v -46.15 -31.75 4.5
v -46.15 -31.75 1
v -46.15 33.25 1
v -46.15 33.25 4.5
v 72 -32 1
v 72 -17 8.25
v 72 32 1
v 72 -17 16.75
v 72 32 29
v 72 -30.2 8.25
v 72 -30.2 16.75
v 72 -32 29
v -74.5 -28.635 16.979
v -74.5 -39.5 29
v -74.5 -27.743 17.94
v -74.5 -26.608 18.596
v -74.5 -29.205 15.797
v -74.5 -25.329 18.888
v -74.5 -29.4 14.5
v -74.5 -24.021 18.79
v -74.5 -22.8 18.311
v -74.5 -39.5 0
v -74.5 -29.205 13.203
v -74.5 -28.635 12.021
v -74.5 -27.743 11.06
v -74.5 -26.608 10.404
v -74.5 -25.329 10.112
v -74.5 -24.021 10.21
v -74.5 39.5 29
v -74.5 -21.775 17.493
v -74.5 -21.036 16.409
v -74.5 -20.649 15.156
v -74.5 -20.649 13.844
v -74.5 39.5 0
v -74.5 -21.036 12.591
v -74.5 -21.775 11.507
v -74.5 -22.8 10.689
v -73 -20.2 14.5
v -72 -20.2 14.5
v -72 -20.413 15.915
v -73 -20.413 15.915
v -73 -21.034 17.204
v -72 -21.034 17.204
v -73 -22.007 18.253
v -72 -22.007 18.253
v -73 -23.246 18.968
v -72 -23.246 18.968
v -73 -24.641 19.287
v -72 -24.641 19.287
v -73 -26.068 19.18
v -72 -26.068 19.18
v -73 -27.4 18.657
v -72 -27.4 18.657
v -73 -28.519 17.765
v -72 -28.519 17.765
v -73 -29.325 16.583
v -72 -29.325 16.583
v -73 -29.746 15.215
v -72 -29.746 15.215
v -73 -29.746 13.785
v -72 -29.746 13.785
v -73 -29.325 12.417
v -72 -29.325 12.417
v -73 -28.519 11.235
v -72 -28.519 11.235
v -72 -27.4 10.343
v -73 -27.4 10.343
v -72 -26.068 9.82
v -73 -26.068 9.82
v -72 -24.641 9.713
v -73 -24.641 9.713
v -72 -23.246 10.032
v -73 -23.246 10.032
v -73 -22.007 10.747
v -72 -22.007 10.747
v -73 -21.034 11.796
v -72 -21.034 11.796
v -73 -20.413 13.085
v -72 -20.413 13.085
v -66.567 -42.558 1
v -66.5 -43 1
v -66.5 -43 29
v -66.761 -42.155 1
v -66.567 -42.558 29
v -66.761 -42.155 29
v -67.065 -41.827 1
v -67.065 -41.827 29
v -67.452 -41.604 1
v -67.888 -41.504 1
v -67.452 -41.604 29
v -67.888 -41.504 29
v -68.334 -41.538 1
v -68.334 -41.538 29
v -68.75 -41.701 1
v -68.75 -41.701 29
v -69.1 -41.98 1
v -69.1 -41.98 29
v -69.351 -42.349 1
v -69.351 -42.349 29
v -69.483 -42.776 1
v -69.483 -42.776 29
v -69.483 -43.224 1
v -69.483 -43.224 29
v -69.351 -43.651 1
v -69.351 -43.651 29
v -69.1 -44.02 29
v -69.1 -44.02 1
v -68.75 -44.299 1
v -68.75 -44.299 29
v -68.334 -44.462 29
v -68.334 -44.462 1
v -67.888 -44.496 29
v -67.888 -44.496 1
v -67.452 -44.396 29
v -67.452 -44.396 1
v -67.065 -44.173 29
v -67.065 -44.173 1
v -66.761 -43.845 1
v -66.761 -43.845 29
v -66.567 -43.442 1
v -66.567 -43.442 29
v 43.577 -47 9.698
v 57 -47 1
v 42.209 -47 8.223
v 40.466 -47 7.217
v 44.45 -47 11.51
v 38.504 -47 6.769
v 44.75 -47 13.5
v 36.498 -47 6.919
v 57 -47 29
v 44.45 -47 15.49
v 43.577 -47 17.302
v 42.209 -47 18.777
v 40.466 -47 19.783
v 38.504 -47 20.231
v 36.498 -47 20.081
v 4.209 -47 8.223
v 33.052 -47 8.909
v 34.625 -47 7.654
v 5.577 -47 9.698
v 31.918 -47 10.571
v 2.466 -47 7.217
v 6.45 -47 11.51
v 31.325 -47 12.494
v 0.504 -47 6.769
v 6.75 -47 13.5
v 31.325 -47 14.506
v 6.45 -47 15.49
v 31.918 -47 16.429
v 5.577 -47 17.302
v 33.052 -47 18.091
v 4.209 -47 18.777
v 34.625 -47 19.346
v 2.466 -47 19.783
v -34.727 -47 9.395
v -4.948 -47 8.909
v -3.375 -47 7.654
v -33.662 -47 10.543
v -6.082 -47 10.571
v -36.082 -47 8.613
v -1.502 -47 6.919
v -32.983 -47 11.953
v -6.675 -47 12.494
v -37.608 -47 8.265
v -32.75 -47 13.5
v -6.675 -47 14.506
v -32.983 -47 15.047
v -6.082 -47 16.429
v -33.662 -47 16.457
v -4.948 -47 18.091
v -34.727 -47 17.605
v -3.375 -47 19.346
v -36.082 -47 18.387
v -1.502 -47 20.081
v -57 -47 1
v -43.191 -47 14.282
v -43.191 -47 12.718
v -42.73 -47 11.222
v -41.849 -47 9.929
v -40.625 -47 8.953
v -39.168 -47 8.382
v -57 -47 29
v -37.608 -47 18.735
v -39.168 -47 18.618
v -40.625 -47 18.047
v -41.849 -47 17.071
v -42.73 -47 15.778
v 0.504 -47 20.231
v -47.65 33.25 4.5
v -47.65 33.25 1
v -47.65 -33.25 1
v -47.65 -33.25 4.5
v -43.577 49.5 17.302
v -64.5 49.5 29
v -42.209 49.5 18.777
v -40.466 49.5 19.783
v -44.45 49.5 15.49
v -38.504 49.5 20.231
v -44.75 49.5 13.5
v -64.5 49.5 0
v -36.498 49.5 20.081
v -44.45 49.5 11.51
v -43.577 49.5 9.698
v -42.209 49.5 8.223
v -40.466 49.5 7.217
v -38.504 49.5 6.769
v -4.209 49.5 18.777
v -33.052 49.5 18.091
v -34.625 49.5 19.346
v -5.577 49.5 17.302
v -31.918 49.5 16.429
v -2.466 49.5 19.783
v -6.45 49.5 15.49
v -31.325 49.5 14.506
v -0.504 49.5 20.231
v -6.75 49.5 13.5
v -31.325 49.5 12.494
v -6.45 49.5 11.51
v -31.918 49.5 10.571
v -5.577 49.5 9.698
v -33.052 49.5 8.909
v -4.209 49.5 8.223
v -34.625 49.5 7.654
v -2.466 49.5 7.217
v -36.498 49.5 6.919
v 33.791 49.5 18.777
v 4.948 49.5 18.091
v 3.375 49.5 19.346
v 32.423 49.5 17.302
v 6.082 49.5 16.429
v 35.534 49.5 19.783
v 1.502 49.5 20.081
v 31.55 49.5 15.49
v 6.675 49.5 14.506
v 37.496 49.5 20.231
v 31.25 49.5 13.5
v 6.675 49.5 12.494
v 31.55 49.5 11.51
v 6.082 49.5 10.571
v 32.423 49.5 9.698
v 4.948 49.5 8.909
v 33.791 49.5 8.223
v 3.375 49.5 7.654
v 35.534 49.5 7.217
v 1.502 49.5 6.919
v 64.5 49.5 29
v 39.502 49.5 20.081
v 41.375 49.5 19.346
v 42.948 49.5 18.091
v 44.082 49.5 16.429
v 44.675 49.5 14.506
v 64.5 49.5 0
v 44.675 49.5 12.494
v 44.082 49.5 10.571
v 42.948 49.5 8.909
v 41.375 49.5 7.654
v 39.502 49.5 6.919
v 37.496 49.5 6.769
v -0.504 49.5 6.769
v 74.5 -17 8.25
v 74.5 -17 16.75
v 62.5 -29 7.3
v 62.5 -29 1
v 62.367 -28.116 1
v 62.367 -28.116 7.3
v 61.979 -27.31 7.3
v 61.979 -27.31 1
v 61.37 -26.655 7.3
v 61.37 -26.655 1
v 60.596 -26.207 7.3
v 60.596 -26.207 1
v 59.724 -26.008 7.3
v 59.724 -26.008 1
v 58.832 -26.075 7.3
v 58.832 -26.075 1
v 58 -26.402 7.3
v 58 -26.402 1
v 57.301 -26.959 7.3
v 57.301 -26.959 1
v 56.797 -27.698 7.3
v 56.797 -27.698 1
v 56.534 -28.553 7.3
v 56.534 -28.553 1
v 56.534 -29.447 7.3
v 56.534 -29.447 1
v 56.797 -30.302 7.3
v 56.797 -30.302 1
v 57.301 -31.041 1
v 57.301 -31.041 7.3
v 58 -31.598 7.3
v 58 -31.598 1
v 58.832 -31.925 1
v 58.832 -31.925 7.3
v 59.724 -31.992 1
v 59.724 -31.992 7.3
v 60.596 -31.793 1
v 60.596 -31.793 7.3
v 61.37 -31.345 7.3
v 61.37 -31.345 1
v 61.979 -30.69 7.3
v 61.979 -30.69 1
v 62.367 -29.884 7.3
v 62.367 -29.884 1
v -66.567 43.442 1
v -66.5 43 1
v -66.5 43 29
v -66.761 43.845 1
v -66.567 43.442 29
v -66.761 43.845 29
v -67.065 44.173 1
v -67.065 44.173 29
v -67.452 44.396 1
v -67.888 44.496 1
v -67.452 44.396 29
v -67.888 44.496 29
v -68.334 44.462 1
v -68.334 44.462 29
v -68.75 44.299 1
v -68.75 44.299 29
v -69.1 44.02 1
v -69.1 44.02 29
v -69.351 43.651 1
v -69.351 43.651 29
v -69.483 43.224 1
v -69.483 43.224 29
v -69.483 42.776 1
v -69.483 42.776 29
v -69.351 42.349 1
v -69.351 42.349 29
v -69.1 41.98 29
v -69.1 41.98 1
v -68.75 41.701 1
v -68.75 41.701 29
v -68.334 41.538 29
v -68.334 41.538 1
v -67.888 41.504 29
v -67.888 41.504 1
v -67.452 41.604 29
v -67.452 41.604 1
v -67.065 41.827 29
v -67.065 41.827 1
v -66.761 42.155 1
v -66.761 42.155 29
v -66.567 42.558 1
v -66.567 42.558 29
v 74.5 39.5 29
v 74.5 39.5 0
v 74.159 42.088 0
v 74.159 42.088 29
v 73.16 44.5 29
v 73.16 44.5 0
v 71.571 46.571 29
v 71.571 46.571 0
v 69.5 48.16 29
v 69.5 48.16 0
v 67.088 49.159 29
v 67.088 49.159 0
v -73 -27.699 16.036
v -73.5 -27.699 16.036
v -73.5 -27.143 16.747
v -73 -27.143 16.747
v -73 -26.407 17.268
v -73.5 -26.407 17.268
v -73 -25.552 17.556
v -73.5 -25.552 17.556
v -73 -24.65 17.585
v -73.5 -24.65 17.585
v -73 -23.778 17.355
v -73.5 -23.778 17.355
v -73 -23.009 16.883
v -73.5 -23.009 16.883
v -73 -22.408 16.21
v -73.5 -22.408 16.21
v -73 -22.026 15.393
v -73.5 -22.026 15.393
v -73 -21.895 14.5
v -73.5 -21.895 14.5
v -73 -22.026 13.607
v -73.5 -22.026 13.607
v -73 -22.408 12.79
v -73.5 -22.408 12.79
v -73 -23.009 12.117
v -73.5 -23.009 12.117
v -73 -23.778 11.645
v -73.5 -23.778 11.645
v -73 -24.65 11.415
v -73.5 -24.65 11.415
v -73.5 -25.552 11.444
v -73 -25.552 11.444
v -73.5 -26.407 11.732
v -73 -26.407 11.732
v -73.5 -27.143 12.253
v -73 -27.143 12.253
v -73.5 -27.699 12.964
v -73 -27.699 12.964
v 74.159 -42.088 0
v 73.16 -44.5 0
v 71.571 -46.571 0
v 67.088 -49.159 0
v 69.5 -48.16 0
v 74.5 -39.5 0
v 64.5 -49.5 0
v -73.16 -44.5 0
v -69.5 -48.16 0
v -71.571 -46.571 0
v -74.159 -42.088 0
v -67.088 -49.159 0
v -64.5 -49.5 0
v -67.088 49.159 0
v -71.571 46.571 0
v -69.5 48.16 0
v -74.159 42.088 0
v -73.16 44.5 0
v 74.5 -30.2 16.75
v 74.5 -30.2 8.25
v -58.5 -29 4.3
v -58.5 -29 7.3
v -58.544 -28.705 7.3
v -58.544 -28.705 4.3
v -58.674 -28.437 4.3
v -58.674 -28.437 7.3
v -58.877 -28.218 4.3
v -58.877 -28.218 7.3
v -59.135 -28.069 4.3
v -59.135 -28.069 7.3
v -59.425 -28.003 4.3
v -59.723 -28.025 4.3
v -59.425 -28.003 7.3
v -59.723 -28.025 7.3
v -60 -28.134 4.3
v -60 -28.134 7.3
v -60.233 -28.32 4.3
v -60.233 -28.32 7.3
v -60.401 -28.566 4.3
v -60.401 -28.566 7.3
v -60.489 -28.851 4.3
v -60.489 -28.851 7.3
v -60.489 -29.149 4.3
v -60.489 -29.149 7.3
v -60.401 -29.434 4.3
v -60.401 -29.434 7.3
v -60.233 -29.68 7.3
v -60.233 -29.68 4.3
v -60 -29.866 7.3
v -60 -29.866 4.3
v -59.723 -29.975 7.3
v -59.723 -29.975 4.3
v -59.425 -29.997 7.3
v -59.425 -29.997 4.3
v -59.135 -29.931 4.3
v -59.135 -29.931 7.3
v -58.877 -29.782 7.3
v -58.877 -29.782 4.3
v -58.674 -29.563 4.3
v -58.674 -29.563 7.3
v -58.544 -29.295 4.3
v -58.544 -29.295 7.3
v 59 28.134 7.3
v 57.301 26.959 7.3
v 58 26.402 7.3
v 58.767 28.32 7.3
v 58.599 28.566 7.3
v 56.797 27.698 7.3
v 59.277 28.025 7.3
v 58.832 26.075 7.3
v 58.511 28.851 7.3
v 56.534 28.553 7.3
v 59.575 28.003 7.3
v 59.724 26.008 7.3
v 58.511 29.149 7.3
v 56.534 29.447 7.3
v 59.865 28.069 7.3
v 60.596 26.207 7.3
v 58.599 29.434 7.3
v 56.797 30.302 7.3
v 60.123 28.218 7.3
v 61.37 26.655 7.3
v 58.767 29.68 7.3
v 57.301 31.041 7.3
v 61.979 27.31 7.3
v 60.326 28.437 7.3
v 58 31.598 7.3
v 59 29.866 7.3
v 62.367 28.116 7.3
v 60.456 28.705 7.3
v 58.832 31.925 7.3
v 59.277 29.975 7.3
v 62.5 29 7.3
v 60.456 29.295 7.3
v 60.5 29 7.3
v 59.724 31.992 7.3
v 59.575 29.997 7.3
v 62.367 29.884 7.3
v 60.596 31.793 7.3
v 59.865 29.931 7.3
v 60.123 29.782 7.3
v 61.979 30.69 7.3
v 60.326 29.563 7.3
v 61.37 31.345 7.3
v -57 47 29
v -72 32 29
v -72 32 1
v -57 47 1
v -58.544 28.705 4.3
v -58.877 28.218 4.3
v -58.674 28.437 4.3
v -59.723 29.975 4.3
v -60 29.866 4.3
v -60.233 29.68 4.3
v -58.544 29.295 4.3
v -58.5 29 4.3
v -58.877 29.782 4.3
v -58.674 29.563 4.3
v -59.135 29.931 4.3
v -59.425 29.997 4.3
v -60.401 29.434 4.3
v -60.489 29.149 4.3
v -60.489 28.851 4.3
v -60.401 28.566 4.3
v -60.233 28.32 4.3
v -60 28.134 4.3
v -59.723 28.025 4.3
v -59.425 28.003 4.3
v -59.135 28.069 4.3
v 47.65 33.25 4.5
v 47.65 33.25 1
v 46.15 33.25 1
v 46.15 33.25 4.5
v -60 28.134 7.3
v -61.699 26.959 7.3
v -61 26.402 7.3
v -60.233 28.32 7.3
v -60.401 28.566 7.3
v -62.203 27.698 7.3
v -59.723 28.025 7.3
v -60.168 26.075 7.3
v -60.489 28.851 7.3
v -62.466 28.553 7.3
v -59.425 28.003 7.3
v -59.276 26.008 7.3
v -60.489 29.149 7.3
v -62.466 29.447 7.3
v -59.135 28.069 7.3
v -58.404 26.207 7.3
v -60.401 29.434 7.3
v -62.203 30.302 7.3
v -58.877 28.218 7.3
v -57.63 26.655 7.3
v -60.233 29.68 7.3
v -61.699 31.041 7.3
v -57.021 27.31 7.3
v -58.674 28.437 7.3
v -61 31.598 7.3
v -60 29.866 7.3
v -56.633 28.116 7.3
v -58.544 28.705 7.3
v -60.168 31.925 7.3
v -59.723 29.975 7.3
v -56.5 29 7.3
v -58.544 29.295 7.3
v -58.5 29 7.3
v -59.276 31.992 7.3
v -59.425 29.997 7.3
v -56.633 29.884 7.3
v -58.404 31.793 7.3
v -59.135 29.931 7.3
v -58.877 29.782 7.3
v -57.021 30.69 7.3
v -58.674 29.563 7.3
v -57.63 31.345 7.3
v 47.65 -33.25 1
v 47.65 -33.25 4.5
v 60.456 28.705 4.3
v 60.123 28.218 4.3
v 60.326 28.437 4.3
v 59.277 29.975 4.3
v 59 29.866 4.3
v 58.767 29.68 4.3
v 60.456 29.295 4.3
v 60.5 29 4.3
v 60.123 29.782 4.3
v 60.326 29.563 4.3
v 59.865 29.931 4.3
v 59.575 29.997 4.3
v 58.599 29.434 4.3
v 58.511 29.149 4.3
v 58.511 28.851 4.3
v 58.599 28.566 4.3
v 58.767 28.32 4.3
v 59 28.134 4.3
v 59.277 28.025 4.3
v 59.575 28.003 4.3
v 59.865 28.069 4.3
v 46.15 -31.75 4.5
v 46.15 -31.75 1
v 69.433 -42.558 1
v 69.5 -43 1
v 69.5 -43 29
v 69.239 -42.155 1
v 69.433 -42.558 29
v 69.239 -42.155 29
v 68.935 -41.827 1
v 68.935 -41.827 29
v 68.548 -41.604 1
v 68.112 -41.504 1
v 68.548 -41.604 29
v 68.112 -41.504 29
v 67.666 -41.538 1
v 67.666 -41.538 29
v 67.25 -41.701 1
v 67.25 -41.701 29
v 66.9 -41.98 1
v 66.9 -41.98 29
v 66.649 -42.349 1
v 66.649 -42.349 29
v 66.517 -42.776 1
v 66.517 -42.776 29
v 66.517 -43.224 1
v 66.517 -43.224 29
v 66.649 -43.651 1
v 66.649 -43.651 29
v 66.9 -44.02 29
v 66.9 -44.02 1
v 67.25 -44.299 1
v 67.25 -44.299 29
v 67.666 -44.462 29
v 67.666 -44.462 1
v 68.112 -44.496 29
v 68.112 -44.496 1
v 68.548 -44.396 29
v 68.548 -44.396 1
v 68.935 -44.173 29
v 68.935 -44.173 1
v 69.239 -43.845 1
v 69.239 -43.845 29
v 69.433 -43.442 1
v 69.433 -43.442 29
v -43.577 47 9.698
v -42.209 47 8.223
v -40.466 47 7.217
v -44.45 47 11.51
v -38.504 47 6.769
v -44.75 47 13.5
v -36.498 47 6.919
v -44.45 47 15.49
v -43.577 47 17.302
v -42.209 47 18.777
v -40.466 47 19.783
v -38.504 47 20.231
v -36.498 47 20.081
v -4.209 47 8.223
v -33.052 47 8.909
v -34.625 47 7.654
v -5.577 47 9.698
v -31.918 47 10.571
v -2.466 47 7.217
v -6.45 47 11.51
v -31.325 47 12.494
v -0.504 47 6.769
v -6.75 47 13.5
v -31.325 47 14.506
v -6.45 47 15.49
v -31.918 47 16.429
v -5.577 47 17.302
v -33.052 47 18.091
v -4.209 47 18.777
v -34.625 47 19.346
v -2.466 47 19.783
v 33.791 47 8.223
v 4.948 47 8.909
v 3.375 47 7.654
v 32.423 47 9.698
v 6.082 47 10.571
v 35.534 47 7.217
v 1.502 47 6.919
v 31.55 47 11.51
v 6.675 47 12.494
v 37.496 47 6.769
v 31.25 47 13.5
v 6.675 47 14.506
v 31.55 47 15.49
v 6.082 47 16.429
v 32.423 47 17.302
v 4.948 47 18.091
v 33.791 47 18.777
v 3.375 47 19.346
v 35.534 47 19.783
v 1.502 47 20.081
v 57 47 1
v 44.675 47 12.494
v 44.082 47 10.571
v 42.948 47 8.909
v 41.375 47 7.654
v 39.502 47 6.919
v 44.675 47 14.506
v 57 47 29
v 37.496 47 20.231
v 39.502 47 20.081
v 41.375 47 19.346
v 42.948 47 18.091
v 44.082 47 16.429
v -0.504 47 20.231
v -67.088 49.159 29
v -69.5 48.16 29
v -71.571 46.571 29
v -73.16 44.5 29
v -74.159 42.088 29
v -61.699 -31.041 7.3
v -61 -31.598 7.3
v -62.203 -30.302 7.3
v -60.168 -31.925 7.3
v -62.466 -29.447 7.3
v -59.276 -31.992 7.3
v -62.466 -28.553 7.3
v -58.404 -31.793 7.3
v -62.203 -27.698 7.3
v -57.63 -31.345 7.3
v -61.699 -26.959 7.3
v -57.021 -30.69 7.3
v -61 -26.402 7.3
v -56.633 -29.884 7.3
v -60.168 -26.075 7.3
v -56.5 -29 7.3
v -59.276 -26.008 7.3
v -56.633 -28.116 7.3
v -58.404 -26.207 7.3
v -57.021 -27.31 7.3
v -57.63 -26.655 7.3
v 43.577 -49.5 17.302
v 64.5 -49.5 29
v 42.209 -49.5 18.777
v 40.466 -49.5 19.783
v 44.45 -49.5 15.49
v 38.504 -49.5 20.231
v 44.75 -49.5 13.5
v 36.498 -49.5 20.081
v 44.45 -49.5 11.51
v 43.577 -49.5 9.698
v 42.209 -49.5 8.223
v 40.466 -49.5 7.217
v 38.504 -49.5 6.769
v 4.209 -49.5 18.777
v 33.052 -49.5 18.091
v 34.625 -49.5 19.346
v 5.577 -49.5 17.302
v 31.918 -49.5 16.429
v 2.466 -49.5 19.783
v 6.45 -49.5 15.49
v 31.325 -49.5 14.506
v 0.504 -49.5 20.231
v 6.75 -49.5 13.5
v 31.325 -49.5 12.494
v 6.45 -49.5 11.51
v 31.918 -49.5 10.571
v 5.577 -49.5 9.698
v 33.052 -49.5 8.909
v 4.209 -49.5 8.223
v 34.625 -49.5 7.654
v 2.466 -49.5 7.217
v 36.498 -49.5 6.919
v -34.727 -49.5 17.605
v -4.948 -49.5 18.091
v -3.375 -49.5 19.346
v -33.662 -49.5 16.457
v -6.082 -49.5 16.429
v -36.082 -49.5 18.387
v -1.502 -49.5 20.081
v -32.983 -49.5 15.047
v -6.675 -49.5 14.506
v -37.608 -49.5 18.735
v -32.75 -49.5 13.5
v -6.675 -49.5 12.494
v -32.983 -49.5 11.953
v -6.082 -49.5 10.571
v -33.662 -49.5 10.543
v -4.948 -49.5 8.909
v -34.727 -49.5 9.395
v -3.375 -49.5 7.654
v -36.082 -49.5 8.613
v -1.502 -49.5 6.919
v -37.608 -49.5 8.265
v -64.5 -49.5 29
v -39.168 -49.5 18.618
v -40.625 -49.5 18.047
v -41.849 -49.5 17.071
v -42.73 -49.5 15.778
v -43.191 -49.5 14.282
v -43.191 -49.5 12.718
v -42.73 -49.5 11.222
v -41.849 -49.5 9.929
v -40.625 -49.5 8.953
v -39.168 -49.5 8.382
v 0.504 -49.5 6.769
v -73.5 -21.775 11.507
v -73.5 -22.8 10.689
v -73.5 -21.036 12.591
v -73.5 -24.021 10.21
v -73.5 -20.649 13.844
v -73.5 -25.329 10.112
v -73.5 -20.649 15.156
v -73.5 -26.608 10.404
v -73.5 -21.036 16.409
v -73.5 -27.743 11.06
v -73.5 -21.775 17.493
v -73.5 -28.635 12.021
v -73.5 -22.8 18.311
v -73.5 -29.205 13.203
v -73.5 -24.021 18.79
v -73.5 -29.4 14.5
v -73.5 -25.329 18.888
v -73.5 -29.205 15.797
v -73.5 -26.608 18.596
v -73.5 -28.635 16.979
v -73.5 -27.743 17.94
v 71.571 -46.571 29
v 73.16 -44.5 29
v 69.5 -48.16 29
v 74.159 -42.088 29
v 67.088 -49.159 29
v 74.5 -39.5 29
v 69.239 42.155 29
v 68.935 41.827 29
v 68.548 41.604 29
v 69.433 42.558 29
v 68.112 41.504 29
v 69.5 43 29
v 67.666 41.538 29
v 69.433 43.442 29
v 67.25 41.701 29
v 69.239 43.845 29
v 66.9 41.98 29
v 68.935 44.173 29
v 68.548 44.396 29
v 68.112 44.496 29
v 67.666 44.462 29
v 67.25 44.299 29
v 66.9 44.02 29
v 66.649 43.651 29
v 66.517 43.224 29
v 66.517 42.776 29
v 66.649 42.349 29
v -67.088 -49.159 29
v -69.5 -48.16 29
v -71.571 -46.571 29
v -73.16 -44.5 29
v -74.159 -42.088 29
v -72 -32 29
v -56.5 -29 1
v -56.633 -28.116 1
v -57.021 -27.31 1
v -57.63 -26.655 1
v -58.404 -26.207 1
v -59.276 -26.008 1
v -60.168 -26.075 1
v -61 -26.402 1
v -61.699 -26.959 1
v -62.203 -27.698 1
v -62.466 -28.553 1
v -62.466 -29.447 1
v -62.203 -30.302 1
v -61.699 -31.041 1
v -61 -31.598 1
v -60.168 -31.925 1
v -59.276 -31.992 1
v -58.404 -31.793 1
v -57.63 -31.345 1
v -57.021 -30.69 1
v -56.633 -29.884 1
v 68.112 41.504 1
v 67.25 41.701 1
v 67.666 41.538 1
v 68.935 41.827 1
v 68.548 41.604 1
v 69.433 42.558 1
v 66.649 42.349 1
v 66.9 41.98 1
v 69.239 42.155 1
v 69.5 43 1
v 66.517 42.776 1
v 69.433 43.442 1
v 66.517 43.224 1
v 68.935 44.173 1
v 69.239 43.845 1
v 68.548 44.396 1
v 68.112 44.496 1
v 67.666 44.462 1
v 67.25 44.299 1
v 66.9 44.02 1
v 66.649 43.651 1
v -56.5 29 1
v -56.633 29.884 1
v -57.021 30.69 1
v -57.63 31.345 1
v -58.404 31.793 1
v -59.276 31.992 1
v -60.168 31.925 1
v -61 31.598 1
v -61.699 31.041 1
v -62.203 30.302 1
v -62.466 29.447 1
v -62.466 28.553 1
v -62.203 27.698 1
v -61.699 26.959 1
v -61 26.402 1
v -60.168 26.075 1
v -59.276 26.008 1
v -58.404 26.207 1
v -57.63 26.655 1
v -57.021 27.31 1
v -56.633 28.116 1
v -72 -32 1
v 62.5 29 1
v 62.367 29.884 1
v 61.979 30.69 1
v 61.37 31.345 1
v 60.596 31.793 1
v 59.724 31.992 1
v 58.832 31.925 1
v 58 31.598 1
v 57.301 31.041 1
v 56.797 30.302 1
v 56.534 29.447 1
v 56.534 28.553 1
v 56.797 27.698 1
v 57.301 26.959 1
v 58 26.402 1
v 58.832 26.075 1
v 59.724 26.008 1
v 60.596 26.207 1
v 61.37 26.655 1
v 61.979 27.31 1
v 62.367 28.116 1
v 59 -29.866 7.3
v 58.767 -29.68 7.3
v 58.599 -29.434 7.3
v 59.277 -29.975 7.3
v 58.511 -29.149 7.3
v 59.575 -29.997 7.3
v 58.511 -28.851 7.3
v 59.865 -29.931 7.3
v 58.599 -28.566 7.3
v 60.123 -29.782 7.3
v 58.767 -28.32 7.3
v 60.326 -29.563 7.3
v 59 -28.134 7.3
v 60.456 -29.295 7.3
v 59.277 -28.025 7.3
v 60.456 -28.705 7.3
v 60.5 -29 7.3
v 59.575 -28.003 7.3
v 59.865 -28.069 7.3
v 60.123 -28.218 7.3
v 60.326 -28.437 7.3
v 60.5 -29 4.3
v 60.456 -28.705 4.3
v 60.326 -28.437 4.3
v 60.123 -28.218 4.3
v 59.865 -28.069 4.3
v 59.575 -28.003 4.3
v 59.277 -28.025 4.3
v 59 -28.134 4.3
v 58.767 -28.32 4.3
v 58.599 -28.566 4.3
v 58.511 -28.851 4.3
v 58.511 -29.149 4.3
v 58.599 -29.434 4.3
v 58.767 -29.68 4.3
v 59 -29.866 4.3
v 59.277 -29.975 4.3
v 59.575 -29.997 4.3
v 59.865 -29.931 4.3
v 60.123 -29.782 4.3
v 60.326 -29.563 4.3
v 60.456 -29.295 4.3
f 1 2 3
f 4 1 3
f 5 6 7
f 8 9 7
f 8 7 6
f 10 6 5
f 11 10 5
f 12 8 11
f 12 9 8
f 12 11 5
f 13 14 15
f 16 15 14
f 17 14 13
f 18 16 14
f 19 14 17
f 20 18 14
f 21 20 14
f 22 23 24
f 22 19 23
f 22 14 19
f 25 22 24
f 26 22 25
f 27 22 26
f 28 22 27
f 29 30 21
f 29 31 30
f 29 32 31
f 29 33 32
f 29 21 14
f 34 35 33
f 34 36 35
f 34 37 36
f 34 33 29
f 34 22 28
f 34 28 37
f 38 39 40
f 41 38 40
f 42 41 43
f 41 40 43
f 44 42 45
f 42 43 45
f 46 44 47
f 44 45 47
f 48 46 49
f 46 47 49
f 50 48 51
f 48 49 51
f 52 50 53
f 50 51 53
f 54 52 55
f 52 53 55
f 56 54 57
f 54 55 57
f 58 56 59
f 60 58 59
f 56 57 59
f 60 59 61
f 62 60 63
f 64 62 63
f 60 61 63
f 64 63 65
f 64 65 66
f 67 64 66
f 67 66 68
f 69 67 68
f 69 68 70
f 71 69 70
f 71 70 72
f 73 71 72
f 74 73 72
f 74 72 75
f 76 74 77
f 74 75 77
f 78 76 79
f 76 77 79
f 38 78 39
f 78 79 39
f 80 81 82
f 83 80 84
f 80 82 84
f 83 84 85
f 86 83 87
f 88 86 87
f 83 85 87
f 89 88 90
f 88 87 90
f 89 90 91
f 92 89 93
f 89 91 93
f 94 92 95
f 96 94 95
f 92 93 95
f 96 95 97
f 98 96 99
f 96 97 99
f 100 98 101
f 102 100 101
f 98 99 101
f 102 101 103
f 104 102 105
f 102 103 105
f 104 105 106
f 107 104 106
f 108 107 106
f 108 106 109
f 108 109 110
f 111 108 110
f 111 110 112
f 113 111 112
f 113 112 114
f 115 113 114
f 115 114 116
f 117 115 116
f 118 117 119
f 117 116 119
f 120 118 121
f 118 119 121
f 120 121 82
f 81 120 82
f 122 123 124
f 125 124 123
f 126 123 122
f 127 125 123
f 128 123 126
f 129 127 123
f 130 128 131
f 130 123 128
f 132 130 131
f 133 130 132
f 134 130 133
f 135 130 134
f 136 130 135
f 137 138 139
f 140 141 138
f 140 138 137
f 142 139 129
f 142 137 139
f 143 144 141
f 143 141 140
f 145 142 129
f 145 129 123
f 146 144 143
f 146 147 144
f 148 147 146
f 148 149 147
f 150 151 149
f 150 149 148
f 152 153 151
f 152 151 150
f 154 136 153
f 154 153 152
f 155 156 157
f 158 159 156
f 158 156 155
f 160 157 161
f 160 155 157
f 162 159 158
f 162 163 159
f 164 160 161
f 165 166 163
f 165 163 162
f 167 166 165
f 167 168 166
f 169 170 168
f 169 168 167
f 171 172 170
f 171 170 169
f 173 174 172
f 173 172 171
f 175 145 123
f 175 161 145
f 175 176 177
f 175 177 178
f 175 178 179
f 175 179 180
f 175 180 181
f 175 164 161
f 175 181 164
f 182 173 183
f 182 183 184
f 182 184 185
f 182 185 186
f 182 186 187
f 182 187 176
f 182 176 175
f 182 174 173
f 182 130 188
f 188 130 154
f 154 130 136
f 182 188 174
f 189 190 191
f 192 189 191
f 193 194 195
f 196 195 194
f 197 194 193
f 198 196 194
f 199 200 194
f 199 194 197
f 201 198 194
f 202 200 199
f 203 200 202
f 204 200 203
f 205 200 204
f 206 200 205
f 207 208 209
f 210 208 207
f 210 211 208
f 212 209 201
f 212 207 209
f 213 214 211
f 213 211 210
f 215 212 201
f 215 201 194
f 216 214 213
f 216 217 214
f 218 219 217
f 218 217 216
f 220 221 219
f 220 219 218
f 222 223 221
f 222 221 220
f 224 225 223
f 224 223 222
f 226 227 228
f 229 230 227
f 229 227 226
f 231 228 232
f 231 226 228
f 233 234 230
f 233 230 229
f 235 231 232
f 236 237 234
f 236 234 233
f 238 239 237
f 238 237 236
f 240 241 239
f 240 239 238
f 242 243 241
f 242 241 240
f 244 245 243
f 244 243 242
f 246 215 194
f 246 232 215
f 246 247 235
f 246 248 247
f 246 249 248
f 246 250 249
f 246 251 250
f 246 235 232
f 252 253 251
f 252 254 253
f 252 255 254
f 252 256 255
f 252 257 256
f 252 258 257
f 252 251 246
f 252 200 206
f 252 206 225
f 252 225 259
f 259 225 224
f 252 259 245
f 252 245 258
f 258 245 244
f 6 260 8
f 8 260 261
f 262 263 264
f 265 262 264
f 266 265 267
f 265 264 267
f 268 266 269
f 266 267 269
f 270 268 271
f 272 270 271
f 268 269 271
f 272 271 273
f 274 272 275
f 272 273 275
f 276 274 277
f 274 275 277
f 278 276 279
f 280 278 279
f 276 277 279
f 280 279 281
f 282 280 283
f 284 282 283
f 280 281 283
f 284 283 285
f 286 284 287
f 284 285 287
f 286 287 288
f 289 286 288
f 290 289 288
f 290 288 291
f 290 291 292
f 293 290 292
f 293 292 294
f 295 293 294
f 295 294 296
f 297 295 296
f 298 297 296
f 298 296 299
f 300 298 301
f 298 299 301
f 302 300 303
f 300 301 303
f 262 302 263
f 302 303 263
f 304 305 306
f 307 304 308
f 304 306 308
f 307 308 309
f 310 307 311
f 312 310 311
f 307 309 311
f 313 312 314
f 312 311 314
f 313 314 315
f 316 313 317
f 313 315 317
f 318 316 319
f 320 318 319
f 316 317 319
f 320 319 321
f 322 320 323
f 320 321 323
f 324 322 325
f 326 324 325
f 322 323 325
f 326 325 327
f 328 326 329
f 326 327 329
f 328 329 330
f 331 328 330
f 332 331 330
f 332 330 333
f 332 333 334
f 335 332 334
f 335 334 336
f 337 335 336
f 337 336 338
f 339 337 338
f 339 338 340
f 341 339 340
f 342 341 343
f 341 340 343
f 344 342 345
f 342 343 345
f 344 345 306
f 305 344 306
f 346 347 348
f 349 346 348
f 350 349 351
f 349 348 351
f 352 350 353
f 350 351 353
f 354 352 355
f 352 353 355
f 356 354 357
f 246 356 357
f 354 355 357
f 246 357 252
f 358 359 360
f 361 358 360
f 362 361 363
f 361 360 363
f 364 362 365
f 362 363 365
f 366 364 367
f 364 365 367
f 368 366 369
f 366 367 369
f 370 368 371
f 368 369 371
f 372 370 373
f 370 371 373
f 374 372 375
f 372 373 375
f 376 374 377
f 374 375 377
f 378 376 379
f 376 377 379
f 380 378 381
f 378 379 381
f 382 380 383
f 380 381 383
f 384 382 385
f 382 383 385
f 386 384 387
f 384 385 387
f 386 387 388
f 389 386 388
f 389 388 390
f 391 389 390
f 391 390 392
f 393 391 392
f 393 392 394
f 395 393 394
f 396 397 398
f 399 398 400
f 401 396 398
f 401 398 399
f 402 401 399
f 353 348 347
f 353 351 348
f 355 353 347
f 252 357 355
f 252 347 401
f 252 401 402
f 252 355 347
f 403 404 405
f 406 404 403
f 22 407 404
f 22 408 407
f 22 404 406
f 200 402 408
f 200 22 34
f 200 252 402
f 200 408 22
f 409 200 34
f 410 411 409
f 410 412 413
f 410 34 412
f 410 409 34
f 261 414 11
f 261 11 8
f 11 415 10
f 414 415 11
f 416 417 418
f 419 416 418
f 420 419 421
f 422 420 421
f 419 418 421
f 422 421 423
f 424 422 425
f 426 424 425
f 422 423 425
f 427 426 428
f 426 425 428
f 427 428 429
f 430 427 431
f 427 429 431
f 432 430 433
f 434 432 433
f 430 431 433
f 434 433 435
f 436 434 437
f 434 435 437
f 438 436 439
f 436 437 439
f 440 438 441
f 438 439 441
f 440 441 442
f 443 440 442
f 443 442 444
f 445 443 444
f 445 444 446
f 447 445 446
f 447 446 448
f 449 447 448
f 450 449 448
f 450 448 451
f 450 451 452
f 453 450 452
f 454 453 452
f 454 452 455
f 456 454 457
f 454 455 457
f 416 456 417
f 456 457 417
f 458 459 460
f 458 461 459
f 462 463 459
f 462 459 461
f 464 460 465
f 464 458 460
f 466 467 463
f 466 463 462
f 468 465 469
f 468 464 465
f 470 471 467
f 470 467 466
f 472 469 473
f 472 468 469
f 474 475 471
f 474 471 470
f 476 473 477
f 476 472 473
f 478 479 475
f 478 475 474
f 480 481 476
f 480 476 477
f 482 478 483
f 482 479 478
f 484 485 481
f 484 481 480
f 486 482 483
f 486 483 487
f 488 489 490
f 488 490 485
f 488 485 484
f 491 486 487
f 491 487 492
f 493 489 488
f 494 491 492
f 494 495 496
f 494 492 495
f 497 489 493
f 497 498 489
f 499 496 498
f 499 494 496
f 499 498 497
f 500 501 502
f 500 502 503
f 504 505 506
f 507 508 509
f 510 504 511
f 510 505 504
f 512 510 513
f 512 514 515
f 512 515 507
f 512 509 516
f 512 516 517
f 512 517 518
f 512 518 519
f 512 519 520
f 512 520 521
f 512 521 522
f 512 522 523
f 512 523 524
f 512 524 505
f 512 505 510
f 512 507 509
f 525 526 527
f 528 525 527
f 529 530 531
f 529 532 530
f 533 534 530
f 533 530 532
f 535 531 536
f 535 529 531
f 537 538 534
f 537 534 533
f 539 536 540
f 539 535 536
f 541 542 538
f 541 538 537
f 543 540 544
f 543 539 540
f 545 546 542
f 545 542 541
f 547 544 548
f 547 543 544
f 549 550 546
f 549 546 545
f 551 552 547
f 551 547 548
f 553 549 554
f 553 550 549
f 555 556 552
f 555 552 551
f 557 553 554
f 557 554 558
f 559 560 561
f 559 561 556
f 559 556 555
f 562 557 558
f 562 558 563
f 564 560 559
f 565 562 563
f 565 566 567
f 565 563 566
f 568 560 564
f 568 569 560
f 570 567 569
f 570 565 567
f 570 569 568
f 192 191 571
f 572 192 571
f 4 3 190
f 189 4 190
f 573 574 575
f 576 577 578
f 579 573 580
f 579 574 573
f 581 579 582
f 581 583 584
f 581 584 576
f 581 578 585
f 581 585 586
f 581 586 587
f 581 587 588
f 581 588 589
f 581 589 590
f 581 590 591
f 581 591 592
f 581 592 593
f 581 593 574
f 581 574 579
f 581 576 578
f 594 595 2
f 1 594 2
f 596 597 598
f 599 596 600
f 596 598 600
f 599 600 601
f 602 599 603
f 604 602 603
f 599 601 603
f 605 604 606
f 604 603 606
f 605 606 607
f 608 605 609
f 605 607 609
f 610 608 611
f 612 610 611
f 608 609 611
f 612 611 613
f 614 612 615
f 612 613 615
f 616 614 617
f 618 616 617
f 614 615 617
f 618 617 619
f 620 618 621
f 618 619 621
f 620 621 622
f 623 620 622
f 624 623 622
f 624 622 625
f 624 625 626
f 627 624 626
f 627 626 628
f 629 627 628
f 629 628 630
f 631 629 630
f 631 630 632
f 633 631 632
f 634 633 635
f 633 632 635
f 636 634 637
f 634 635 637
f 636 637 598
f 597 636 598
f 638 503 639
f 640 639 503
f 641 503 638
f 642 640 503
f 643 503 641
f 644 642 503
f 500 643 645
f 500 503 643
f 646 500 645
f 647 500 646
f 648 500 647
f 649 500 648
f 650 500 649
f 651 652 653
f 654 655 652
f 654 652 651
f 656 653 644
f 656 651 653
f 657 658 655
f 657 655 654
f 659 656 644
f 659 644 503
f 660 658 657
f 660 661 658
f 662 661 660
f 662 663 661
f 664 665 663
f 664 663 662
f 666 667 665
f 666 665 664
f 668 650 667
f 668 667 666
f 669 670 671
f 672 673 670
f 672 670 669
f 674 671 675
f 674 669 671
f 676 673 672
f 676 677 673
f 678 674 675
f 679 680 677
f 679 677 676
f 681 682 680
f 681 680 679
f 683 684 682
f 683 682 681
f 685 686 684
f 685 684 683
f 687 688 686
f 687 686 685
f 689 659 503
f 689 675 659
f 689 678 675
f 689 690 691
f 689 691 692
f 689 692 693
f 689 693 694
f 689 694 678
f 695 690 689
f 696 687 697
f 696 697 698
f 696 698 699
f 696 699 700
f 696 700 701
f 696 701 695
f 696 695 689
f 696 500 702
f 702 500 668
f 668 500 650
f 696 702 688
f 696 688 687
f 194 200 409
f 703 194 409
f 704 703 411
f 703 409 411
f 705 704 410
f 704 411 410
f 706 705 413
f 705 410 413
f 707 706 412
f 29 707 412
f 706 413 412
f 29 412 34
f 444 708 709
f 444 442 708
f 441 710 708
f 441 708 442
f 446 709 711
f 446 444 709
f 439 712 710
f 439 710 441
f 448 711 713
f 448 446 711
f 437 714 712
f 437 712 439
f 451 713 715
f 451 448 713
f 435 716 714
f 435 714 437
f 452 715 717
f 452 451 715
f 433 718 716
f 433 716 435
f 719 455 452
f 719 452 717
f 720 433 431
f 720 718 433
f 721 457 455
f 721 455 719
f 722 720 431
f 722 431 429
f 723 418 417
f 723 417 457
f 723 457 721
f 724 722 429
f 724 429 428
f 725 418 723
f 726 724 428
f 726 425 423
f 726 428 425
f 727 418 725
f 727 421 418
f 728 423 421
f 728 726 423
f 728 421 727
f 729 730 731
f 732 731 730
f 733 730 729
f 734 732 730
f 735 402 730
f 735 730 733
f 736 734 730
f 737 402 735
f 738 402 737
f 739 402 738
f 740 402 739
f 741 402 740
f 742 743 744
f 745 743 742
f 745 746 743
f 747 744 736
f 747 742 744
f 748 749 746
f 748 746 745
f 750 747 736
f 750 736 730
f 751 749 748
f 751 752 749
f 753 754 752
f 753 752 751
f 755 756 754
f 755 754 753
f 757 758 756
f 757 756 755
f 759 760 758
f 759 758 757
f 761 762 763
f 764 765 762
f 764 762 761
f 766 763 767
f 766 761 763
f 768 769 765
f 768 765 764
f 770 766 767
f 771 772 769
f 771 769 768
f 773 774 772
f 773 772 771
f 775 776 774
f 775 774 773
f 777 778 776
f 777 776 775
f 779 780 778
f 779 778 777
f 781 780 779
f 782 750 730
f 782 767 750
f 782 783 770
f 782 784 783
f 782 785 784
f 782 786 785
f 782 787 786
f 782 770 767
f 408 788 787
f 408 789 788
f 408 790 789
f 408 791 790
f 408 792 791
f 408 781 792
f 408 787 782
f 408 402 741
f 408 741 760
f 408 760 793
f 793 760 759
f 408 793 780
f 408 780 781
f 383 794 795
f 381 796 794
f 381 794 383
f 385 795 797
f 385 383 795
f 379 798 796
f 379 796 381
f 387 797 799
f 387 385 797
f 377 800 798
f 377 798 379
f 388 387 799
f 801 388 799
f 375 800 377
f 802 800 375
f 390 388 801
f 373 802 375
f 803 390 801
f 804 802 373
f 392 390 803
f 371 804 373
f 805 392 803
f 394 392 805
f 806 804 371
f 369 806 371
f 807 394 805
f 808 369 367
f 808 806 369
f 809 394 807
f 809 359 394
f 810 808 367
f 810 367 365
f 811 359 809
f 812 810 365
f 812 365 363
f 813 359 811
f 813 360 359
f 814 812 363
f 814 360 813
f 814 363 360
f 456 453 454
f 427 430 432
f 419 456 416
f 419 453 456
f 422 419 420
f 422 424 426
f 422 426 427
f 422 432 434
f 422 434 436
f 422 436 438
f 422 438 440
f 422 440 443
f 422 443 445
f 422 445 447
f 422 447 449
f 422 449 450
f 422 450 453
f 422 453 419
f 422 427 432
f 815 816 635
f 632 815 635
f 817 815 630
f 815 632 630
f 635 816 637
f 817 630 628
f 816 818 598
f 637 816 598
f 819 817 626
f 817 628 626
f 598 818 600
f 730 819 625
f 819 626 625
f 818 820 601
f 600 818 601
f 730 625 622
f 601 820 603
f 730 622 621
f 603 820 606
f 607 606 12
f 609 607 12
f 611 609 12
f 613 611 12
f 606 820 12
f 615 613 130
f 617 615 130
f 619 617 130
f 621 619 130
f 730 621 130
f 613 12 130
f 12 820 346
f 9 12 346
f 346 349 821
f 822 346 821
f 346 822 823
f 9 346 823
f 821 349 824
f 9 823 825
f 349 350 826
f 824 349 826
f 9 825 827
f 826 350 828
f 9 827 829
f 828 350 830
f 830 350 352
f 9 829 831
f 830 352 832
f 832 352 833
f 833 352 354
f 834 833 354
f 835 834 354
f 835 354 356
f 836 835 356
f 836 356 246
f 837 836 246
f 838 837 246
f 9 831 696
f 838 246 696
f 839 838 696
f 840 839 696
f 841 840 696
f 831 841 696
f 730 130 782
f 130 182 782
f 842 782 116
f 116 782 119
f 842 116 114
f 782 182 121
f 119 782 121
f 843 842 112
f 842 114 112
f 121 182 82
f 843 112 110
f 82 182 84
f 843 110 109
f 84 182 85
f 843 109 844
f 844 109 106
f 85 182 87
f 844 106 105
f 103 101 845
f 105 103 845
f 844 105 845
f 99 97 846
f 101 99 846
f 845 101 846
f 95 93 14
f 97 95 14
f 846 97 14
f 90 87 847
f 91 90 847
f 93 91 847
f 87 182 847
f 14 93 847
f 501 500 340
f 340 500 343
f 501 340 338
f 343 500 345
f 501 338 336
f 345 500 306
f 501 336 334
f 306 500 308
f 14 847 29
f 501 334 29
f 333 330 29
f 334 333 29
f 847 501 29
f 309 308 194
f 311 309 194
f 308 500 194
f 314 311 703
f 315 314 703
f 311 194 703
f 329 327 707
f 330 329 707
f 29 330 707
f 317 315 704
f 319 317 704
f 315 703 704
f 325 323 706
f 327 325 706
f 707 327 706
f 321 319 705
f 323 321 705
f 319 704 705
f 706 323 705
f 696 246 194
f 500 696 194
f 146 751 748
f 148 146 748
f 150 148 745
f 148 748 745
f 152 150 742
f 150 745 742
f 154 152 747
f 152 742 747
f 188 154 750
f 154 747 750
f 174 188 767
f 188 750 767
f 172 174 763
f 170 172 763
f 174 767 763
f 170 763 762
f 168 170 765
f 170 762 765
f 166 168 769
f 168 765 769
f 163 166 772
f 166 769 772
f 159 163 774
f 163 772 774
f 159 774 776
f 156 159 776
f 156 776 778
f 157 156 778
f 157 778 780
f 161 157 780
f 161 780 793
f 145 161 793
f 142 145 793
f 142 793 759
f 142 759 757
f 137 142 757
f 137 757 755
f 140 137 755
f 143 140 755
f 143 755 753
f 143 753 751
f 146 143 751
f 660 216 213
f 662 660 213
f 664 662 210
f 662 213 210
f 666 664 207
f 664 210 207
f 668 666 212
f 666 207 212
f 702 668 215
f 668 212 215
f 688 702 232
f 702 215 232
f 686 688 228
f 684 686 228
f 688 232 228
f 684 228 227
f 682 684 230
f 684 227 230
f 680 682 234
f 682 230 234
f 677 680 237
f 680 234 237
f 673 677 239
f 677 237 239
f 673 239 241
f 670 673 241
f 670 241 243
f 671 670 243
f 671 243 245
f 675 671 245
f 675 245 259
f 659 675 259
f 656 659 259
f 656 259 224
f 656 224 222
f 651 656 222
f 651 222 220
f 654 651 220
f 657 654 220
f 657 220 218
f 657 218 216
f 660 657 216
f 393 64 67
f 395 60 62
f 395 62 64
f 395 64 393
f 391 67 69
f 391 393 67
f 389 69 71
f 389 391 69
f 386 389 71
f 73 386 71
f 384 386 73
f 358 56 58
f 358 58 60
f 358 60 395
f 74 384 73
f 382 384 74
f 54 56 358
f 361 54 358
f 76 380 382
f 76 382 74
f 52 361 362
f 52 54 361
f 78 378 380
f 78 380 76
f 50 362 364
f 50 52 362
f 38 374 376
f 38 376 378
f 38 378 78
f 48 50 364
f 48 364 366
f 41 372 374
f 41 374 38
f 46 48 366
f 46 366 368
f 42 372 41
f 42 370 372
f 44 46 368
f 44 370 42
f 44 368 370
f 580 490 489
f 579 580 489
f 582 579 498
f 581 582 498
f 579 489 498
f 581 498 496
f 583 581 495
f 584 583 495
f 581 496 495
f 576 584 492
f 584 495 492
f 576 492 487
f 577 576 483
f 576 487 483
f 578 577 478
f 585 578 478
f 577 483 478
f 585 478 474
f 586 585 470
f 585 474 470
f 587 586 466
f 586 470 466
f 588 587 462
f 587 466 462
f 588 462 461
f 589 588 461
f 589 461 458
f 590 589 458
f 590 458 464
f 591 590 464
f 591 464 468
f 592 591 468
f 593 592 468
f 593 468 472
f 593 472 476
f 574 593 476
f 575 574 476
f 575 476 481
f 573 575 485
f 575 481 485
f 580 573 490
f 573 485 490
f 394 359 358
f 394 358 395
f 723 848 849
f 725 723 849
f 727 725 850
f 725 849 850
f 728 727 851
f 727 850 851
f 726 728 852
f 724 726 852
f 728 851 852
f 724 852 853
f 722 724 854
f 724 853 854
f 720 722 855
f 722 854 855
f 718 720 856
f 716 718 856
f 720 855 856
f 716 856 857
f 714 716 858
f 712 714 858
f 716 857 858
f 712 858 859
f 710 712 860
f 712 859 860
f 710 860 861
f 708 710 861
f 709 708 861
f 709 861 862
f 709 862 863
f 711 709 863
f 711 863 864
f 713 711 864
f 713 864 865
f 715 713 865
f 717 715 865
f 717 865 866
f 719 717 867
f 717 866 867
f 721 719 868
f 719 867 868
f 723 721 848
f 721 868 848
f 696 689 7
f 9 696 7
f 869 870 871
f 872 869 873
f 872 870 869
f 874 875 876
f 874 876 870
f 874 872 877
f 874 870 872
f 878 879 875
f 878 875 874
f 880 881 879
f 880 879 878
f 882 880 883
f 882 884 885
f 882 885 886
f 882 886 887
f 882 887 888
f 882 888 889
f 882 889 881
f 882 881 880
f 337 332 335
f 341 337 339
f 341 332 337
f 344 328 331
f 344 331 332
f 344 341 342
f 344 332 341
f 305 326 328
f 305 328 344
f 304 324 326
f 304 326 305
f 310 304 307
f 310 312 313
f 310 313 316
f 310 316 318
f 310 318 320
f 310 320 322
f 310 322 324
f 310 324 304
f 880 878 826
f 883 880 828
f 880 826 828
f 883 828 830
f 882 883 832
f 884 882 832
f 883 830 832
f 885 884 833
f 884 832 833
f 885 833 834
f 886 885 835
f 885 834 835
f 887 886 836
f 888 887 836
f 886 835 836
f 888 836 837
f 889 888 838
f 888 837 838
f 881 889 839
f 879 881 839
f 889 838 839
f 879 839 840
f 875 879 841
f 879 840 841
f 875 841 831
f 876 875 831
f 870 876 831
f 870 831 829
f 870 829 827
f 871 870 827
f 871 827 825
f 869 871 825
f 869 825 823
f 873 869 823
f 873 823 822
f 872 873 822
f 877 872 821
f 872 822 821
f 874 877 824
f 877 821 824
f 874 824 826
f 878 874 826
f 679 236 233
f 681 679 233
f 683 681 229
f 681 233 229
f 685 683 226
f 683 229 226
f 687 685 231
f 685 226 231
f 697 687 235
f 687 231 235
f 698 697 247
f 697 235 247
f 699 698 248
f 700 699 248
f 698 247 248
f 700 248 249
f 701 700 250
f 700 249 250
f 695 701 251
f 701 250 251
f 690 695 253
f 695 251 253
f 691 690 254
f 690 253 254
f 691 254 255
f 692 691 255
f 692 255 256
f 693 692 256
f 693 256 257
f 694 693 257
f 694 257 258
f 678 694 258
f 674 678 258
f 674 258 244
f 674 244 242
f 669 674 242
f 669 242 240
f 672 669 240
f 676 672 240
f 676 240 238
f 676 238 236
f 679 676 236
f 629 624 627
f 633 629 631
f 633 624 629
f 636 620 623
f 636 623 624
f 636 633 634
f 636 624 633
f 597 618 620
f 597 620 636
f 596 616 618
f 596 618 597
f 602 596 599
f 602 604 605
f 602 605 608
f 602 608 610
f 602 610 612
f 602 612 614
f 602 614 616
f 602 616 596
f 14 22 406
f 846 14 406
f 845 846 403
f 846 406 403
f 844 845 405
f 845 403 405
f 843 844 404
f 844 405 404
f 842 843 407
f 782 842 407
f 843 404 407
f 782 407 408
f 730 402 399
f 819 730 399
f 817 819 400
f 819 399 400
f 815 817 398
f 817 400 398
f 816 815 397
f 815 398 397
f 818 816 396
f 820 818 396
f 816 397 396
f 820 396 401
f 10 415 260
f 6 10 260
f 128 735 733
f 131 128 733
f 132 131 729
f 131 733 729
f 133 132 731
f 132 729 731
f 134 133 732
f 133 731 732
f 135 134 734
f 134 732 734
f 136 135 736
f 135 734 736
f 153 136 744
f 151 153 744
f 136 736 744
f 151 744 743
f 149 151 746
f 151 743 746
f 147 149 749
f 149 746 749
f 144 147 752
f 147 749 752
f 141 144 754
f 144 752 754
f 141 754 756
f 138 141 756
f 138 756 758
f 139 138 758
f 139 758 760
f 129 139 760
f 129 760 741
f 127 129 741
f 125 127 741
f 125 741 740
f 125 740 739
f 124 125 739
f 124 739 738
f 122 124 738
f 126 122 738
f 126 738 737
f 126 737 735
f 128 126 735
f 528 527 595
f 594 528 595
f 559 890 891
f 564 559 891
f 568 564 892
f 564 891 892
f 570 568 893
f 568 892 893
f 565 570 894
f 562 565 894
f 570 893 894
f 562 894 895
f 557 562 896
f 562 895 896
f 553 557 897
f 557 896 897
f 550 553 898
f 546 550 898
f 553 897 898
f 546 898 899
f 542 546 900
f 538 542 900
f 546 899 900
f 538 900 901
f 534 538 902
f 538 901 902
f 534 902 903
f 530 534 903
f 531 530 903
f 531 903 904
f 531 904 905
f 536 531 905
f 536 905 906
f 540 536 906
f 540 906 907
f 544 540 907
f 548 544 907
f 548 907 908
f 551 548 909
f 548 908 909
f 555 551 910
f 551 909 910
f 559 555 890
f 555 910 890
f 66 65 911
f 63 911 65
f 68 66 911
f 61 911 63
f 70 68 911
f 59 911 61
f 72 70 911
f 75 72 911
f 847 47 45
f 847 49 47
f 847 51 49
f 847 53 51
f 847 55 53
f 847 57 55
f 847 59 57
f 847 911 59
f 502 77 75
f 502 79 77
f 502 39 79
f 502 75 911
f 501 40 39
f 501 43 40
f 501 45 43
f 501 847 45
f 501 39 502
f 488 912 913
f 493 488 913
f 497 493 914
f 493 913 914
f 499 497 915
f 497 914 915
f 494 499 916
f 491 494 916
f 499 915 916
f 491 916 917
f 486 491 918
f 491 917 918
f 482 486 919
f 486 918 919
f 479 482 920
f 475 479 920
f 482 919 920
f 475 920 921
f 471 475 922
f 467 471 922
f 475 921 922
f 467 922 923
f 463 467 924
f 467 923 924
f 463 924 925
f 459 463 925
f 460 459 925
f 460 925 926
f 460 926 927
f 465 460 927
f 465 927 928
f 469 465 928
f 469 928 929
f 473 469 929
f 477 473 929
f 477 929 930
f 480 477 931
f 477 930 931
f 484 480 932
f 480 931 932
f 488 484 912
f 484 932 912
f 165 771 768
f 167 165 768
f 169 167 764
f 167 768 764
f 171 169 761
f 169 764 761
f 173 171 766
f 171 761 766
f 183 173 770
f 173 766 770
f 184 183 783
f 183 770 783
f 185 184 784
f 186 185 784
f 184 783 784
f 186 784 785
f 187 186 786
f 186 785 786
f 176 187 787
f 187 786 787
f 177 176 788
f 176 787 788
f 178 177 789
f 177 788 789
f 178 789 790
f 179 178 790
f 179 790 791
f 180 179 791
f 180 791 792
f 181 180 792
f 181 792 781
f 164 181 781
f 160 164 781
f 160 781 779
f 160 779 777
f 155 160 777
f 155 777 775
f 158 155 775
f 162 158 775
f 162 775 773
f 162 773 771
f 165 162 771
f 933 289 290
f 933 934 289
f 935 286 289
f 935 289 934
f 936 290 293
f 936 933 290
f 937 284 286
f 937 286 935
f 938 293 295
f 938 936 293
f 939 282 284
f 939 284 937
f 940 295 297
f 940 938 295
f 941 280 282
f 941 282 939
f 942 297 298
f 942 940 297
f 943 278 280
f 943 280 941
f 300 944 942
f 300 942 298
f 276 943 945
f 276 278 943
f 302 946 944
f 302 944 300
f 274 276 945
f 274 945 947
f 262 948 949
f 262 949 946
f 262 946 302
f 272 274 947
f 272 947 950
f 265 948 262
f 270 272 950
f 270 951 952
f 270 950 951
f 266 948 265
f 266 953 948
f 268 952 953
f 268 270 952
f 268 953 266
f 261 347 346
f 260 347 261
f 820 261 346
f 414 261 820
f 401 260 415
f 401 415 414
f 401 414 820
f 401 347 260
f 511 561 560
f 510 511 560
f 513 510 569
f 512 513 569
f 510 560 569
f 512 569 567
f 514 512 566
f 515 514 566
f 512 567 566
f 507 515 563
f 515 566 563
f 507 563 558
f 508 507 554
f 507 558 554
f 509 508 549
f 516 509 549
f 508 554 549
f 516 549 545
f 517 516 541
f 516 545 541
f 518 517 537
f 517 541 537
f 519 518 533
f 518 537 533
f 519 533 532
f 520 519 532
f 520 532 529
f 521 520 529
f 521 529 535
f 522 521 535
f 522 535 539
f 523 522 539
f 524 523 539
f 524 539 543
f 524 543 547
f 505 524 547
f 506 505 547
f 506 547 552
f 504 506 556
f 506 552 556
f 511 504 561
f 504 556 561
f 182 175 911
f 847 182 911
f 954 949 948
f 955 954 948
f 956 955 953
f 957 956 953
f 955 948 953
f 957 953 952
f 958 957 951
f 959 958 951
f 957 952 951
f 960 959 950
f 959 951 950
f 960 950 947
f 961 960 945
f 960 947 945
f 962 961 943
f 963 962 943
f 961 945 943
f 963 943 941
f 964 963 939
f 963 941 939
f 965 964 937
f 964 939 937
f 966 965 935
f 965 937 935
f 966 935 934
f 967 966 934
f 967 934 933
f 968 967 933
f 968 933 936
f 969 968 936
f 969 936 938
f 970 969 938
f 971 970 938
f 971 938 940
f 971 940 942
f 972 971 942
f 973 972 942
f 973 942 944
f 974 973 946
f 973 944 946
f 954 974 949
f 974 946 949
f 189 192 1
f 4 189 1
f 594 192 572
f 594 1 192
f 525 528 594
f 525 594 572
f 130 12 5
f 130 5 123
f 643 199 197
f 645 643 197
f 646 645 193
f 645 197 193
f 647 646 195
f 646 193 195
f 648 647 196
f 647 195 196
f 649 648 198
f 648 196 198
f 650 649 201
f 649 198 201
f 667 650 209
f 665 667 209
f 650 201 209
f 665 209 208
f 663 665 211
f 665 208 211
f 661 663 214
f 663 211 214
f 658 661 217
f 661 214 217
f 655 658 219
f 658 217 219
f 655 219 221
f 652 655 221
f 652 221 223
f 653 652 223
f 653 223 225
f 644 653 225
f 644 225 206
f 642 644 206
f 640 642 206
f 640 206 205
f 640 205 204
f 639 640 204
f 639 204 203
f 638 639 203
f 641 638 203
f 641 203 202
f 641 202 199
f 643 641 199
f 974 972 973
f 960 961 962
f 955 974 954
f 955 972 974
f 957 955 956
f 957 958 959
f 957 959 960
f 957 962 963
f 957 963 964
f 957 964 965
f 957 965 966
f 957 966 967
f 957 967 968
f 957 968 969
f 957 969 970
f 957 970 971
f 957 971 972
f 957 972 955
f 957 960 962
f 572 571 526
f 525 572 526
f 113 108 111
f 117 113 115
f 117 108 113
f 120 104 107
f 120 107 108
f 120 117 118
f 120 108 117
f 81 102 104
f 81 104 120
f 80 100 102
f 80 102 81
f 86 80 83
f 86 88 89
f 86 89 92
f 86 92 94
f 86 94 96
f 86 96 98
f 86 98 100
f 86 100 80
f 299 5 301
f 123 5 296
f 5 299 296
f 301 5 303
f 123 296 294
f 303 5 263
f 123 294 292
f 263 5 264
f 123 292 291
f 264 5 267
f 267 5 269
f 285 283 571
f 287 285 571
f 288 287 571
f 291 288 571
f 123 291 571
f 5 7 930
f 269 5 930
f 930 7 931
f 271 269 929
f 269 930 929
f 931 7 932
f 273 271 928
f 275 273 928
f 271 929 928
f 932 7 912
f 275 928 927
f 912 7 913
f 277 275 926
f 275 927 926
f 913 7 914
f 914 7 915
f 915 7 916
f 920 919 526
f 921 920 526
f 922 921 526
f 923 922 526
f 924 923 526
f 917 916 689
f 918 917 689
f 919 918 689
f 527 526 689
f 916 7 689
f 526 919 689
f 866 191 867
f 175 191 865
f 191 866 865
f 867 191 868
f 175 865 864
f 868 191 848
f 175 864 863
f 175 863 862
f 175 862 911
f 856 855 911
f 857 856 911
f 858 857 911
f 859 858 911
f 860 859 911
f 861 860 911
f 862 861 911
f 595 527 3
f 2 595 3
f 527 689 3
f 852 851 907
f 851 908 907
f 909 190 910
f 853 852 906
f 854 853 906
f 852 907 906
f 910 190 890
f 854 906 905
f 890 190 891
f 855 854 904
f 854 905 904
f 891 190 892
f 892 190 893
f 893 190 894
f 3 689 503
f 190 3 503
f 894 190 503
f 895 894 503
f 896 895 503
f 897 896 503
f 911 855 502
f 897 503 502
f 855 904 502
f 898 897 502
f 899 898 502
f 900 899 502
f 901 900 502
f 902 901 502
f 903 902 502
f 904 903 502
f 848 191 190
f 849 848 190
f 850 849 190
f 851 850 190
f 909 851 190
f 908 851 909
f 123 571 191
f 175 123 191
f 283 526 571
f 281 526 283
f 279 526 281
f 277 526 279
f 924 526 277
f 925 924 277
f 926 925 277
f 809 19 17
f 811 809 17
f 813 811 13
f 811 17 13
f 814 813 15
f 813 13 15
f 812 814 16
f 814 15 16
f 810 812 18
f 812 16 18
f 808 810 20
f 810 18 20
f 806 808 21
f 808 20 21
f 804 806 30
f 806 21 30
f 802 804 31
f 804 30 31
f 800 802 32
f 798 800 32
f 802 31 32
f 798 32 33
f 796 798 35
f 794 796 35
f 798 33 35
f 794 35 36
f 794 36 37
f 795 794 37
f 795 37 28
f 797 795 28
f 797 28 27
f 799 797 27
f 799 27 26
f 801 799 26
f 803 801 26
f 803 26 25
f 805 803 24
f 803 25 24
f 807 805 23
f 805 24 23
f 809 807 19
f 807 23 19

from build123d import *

# Parameters (mm, degrees)
PAD_DEPTH       = 29
SKETCH001_R     = 1.5
POCKET_DEPTH    = 28
SKETCH004_R     = 3
PAD001_DEPTH    = 6.3
SKETCH006_R     = 6.75
POCKET003_DEPTH = 5
SKETCH008_W     = 13.2
SKETCH008_H     = 8.5
POCKET005_DEPTH = 5
PAD002_DEPTH    = 3.5
SKETCH014_R     = 4.8
POCKET010_DEPTH = 1
SKETCH011_R     = 6.75
SKETCH011_R_2   = 5.25
POCKET011_DEPTH = 5
SKETCH015_R     = 4.4
POCKET012_DEPTH = 1
POCKET013_DEPTH = 5
SKETCH016_R     = 1
POCKET014_DEPTH = 3


with BuildPart() as part:
    # Sketch → Pad (new body)
    with BuildSketch(Plane.XY):
        with BuildLine():
            Line((-64.5, 49.5), (64.5, 49.5))
            ThreePointArc((74.5, 39.5), (71.571068, 46.571068), (64.5, 49.5))
            Line((74.5, 39.5), (74.5, -39.5))
            ThreePointArc((64.5, -49.5), (71.571068, -46.571068), (74.5, -39.5))
            Line((64.5, -49.5), (-64.5, -49.5))
            ThreePointArc((-74.5, -39.5), (-71.571068, -46.571068), (-64.5, -49.5))
            Line((-74.5, -39.5), (-74.5, 39.5))
            ThreePointArc((-64.5, 49.5), (-71.571068, 46.571068), (-74.5, 39.5))
        make_face()
    extrude(amount=PAD_DEPTH)

    # Sketch001 (on Face10 of Pad) → Pocket (cut)
    with BuildSketch(Plane.XY.offset(29)):
        with Locations((68, 43)):
            Circle(SKETCH001_R)
        with Locations((-68, 43)):
            Circle(SKETCH001_R)
        with Locations((68, -43)):
            Circle(SKETCH001_R)
        with Locations((-68, -43)):
            Circle(SKETCH001_R)
        Polygon((-57, 47), (57, 47), (72, 32), (72, -32), (57, -47), (-57, -47), (-72, -32), (-72, 32), align=None)
    extrude(amount=-POCKET_DEPTH, mode=Mode.SUBTRACT)

    # Sketch004 (on Face24 of Pocket) → Pad001 (join)
    with BuildSketch(Plane.XY.offset(1)):
        with Locations((-59.5, 29)):
            Circle(SKETCH004_R)
        with Locations((-59.5, -29)):
            Circle(SKETCH004_R)
        with Locations((59.5, -29)):
            Circle(SKETCH004_R)
        with Locations((59.5, 29)):
            Circle(SKETCH004_R)
    extrude(amount=PAD001_DEPTH)

    # Sketch006 (on Face7 of Pad001) → Pocket003 (cut)
    with BuildSketch(Plane(origin=(0, 49.5, 0), x_dir=(-1, 0, 0), z_dir=(0, 1, 0))):
        with Locations((-38, 13.5)):
            Circle(SKETCH006_R)
        with Locations((0, 13.5)):
            Circle(SKETCH006_R)
        with Locations((38, 13.5)):
            Circle(SKETCH006_R)
    extrude(amount=-POCKET003_DEPTH, mode=Mode.SUBTRACT)

    # Sketch008 (on Face9 of Pocket003) → Pocket005 (cut)
    with BuildSketch(Plane.YZ.offset(74.5)):
        with Locations((-23.6, 12.5)):
            Rectangle(SKETCH008_W, SKETCH008_H)
    extrude(amount=-POCKET005_DEPTH, mode=Mode.SUBTRACT)

    # Sketch010 → Pad002 (join)
    with BuildSketch(Plane.XY.offset(1)):
        Polygon((-47.65, 33.25), (-47.65, -33.25), (47.65, -33.25), (47.65, 33.25), (46.15, 33.25), (46.15, -31.75), (-46.15, -31.75), (-46.15, 33.25), align=None)
    extrude(amount=PAD002_DEPTH)

    # Sketch014 → Pocket010 (cut)
    with BuildSketch(Plane.YZ.offset(-72)):
        with Locations((-25, 14.5)):
            Circle(SKETCH014_R)
    extrude(amount=-POCKET010_DEPTH, mode=Mode.SUBTRACT)

    # Sketch011 → Pocket011 (cut)
    with BuildSketch(Plane.XZ.offset(49.5)):
        with Locations((0, 13.5)):
            Circle(SKETCH011_R)
        with Locations((38, 13.5)):
            Circle(SKETCH011_R)
        with Locations((-38, 13.5)):
            Circle(SKETCH011_R_2)
    extrude(amount=-POCKET011_DEPTH, mode=Mode.SUBTRACT)

    # Sketch015 → Pocket012 (cut)
    with BuildSketch(Plane(origin=(-74.5, 0, 0), x_dir=(0, -1, 0), z_dir=(-1, 0, 0))):
        with Locations((25, 14.5)):
            Circle(SKETCH015_R)
    extrude(amount=-POCKET012_DEPTH, mode=Mode.SUBTRACT)

    # Sketch012 → Pocket013 (cut)
    with BuildSketch(Plane(origin=(-74.5, 0, 0), x_dir=(0, -1, 0), z_dir=(-1, 0, 0))):
        with BuildLine():
            ThreePointArc((27.69875, 16.035808), (21.89485, 14.5), (27.69875, 12.964192))
            Line((27.69875, 16.035808), (27.69875, 12.964192))
        make_face()
    extrude(amount=-POCKET013_DEPTH, mode=Mode.SUBTRACT)

    # Sketch016 (on Face37 of Pocket013) → Pocket014 (cut)
    with BuildSketch(Plane.XY.offset(7.3)):
        with Locations((-59.5, 29)):
            Circle(SKETCH016_R)
        with Locations((-59.5, -29)):
            Circle(SKETCH016_R)
        with Locations((59.5, 29)):
            Circle(SKETCH016_R)
        with Locations((59.5, -29)):
            Circle(SKETCH016_R)
    extrude(amount=-POCKET014_DEPTH, mode=Mode.SUBTRACT)


solid = part.part
